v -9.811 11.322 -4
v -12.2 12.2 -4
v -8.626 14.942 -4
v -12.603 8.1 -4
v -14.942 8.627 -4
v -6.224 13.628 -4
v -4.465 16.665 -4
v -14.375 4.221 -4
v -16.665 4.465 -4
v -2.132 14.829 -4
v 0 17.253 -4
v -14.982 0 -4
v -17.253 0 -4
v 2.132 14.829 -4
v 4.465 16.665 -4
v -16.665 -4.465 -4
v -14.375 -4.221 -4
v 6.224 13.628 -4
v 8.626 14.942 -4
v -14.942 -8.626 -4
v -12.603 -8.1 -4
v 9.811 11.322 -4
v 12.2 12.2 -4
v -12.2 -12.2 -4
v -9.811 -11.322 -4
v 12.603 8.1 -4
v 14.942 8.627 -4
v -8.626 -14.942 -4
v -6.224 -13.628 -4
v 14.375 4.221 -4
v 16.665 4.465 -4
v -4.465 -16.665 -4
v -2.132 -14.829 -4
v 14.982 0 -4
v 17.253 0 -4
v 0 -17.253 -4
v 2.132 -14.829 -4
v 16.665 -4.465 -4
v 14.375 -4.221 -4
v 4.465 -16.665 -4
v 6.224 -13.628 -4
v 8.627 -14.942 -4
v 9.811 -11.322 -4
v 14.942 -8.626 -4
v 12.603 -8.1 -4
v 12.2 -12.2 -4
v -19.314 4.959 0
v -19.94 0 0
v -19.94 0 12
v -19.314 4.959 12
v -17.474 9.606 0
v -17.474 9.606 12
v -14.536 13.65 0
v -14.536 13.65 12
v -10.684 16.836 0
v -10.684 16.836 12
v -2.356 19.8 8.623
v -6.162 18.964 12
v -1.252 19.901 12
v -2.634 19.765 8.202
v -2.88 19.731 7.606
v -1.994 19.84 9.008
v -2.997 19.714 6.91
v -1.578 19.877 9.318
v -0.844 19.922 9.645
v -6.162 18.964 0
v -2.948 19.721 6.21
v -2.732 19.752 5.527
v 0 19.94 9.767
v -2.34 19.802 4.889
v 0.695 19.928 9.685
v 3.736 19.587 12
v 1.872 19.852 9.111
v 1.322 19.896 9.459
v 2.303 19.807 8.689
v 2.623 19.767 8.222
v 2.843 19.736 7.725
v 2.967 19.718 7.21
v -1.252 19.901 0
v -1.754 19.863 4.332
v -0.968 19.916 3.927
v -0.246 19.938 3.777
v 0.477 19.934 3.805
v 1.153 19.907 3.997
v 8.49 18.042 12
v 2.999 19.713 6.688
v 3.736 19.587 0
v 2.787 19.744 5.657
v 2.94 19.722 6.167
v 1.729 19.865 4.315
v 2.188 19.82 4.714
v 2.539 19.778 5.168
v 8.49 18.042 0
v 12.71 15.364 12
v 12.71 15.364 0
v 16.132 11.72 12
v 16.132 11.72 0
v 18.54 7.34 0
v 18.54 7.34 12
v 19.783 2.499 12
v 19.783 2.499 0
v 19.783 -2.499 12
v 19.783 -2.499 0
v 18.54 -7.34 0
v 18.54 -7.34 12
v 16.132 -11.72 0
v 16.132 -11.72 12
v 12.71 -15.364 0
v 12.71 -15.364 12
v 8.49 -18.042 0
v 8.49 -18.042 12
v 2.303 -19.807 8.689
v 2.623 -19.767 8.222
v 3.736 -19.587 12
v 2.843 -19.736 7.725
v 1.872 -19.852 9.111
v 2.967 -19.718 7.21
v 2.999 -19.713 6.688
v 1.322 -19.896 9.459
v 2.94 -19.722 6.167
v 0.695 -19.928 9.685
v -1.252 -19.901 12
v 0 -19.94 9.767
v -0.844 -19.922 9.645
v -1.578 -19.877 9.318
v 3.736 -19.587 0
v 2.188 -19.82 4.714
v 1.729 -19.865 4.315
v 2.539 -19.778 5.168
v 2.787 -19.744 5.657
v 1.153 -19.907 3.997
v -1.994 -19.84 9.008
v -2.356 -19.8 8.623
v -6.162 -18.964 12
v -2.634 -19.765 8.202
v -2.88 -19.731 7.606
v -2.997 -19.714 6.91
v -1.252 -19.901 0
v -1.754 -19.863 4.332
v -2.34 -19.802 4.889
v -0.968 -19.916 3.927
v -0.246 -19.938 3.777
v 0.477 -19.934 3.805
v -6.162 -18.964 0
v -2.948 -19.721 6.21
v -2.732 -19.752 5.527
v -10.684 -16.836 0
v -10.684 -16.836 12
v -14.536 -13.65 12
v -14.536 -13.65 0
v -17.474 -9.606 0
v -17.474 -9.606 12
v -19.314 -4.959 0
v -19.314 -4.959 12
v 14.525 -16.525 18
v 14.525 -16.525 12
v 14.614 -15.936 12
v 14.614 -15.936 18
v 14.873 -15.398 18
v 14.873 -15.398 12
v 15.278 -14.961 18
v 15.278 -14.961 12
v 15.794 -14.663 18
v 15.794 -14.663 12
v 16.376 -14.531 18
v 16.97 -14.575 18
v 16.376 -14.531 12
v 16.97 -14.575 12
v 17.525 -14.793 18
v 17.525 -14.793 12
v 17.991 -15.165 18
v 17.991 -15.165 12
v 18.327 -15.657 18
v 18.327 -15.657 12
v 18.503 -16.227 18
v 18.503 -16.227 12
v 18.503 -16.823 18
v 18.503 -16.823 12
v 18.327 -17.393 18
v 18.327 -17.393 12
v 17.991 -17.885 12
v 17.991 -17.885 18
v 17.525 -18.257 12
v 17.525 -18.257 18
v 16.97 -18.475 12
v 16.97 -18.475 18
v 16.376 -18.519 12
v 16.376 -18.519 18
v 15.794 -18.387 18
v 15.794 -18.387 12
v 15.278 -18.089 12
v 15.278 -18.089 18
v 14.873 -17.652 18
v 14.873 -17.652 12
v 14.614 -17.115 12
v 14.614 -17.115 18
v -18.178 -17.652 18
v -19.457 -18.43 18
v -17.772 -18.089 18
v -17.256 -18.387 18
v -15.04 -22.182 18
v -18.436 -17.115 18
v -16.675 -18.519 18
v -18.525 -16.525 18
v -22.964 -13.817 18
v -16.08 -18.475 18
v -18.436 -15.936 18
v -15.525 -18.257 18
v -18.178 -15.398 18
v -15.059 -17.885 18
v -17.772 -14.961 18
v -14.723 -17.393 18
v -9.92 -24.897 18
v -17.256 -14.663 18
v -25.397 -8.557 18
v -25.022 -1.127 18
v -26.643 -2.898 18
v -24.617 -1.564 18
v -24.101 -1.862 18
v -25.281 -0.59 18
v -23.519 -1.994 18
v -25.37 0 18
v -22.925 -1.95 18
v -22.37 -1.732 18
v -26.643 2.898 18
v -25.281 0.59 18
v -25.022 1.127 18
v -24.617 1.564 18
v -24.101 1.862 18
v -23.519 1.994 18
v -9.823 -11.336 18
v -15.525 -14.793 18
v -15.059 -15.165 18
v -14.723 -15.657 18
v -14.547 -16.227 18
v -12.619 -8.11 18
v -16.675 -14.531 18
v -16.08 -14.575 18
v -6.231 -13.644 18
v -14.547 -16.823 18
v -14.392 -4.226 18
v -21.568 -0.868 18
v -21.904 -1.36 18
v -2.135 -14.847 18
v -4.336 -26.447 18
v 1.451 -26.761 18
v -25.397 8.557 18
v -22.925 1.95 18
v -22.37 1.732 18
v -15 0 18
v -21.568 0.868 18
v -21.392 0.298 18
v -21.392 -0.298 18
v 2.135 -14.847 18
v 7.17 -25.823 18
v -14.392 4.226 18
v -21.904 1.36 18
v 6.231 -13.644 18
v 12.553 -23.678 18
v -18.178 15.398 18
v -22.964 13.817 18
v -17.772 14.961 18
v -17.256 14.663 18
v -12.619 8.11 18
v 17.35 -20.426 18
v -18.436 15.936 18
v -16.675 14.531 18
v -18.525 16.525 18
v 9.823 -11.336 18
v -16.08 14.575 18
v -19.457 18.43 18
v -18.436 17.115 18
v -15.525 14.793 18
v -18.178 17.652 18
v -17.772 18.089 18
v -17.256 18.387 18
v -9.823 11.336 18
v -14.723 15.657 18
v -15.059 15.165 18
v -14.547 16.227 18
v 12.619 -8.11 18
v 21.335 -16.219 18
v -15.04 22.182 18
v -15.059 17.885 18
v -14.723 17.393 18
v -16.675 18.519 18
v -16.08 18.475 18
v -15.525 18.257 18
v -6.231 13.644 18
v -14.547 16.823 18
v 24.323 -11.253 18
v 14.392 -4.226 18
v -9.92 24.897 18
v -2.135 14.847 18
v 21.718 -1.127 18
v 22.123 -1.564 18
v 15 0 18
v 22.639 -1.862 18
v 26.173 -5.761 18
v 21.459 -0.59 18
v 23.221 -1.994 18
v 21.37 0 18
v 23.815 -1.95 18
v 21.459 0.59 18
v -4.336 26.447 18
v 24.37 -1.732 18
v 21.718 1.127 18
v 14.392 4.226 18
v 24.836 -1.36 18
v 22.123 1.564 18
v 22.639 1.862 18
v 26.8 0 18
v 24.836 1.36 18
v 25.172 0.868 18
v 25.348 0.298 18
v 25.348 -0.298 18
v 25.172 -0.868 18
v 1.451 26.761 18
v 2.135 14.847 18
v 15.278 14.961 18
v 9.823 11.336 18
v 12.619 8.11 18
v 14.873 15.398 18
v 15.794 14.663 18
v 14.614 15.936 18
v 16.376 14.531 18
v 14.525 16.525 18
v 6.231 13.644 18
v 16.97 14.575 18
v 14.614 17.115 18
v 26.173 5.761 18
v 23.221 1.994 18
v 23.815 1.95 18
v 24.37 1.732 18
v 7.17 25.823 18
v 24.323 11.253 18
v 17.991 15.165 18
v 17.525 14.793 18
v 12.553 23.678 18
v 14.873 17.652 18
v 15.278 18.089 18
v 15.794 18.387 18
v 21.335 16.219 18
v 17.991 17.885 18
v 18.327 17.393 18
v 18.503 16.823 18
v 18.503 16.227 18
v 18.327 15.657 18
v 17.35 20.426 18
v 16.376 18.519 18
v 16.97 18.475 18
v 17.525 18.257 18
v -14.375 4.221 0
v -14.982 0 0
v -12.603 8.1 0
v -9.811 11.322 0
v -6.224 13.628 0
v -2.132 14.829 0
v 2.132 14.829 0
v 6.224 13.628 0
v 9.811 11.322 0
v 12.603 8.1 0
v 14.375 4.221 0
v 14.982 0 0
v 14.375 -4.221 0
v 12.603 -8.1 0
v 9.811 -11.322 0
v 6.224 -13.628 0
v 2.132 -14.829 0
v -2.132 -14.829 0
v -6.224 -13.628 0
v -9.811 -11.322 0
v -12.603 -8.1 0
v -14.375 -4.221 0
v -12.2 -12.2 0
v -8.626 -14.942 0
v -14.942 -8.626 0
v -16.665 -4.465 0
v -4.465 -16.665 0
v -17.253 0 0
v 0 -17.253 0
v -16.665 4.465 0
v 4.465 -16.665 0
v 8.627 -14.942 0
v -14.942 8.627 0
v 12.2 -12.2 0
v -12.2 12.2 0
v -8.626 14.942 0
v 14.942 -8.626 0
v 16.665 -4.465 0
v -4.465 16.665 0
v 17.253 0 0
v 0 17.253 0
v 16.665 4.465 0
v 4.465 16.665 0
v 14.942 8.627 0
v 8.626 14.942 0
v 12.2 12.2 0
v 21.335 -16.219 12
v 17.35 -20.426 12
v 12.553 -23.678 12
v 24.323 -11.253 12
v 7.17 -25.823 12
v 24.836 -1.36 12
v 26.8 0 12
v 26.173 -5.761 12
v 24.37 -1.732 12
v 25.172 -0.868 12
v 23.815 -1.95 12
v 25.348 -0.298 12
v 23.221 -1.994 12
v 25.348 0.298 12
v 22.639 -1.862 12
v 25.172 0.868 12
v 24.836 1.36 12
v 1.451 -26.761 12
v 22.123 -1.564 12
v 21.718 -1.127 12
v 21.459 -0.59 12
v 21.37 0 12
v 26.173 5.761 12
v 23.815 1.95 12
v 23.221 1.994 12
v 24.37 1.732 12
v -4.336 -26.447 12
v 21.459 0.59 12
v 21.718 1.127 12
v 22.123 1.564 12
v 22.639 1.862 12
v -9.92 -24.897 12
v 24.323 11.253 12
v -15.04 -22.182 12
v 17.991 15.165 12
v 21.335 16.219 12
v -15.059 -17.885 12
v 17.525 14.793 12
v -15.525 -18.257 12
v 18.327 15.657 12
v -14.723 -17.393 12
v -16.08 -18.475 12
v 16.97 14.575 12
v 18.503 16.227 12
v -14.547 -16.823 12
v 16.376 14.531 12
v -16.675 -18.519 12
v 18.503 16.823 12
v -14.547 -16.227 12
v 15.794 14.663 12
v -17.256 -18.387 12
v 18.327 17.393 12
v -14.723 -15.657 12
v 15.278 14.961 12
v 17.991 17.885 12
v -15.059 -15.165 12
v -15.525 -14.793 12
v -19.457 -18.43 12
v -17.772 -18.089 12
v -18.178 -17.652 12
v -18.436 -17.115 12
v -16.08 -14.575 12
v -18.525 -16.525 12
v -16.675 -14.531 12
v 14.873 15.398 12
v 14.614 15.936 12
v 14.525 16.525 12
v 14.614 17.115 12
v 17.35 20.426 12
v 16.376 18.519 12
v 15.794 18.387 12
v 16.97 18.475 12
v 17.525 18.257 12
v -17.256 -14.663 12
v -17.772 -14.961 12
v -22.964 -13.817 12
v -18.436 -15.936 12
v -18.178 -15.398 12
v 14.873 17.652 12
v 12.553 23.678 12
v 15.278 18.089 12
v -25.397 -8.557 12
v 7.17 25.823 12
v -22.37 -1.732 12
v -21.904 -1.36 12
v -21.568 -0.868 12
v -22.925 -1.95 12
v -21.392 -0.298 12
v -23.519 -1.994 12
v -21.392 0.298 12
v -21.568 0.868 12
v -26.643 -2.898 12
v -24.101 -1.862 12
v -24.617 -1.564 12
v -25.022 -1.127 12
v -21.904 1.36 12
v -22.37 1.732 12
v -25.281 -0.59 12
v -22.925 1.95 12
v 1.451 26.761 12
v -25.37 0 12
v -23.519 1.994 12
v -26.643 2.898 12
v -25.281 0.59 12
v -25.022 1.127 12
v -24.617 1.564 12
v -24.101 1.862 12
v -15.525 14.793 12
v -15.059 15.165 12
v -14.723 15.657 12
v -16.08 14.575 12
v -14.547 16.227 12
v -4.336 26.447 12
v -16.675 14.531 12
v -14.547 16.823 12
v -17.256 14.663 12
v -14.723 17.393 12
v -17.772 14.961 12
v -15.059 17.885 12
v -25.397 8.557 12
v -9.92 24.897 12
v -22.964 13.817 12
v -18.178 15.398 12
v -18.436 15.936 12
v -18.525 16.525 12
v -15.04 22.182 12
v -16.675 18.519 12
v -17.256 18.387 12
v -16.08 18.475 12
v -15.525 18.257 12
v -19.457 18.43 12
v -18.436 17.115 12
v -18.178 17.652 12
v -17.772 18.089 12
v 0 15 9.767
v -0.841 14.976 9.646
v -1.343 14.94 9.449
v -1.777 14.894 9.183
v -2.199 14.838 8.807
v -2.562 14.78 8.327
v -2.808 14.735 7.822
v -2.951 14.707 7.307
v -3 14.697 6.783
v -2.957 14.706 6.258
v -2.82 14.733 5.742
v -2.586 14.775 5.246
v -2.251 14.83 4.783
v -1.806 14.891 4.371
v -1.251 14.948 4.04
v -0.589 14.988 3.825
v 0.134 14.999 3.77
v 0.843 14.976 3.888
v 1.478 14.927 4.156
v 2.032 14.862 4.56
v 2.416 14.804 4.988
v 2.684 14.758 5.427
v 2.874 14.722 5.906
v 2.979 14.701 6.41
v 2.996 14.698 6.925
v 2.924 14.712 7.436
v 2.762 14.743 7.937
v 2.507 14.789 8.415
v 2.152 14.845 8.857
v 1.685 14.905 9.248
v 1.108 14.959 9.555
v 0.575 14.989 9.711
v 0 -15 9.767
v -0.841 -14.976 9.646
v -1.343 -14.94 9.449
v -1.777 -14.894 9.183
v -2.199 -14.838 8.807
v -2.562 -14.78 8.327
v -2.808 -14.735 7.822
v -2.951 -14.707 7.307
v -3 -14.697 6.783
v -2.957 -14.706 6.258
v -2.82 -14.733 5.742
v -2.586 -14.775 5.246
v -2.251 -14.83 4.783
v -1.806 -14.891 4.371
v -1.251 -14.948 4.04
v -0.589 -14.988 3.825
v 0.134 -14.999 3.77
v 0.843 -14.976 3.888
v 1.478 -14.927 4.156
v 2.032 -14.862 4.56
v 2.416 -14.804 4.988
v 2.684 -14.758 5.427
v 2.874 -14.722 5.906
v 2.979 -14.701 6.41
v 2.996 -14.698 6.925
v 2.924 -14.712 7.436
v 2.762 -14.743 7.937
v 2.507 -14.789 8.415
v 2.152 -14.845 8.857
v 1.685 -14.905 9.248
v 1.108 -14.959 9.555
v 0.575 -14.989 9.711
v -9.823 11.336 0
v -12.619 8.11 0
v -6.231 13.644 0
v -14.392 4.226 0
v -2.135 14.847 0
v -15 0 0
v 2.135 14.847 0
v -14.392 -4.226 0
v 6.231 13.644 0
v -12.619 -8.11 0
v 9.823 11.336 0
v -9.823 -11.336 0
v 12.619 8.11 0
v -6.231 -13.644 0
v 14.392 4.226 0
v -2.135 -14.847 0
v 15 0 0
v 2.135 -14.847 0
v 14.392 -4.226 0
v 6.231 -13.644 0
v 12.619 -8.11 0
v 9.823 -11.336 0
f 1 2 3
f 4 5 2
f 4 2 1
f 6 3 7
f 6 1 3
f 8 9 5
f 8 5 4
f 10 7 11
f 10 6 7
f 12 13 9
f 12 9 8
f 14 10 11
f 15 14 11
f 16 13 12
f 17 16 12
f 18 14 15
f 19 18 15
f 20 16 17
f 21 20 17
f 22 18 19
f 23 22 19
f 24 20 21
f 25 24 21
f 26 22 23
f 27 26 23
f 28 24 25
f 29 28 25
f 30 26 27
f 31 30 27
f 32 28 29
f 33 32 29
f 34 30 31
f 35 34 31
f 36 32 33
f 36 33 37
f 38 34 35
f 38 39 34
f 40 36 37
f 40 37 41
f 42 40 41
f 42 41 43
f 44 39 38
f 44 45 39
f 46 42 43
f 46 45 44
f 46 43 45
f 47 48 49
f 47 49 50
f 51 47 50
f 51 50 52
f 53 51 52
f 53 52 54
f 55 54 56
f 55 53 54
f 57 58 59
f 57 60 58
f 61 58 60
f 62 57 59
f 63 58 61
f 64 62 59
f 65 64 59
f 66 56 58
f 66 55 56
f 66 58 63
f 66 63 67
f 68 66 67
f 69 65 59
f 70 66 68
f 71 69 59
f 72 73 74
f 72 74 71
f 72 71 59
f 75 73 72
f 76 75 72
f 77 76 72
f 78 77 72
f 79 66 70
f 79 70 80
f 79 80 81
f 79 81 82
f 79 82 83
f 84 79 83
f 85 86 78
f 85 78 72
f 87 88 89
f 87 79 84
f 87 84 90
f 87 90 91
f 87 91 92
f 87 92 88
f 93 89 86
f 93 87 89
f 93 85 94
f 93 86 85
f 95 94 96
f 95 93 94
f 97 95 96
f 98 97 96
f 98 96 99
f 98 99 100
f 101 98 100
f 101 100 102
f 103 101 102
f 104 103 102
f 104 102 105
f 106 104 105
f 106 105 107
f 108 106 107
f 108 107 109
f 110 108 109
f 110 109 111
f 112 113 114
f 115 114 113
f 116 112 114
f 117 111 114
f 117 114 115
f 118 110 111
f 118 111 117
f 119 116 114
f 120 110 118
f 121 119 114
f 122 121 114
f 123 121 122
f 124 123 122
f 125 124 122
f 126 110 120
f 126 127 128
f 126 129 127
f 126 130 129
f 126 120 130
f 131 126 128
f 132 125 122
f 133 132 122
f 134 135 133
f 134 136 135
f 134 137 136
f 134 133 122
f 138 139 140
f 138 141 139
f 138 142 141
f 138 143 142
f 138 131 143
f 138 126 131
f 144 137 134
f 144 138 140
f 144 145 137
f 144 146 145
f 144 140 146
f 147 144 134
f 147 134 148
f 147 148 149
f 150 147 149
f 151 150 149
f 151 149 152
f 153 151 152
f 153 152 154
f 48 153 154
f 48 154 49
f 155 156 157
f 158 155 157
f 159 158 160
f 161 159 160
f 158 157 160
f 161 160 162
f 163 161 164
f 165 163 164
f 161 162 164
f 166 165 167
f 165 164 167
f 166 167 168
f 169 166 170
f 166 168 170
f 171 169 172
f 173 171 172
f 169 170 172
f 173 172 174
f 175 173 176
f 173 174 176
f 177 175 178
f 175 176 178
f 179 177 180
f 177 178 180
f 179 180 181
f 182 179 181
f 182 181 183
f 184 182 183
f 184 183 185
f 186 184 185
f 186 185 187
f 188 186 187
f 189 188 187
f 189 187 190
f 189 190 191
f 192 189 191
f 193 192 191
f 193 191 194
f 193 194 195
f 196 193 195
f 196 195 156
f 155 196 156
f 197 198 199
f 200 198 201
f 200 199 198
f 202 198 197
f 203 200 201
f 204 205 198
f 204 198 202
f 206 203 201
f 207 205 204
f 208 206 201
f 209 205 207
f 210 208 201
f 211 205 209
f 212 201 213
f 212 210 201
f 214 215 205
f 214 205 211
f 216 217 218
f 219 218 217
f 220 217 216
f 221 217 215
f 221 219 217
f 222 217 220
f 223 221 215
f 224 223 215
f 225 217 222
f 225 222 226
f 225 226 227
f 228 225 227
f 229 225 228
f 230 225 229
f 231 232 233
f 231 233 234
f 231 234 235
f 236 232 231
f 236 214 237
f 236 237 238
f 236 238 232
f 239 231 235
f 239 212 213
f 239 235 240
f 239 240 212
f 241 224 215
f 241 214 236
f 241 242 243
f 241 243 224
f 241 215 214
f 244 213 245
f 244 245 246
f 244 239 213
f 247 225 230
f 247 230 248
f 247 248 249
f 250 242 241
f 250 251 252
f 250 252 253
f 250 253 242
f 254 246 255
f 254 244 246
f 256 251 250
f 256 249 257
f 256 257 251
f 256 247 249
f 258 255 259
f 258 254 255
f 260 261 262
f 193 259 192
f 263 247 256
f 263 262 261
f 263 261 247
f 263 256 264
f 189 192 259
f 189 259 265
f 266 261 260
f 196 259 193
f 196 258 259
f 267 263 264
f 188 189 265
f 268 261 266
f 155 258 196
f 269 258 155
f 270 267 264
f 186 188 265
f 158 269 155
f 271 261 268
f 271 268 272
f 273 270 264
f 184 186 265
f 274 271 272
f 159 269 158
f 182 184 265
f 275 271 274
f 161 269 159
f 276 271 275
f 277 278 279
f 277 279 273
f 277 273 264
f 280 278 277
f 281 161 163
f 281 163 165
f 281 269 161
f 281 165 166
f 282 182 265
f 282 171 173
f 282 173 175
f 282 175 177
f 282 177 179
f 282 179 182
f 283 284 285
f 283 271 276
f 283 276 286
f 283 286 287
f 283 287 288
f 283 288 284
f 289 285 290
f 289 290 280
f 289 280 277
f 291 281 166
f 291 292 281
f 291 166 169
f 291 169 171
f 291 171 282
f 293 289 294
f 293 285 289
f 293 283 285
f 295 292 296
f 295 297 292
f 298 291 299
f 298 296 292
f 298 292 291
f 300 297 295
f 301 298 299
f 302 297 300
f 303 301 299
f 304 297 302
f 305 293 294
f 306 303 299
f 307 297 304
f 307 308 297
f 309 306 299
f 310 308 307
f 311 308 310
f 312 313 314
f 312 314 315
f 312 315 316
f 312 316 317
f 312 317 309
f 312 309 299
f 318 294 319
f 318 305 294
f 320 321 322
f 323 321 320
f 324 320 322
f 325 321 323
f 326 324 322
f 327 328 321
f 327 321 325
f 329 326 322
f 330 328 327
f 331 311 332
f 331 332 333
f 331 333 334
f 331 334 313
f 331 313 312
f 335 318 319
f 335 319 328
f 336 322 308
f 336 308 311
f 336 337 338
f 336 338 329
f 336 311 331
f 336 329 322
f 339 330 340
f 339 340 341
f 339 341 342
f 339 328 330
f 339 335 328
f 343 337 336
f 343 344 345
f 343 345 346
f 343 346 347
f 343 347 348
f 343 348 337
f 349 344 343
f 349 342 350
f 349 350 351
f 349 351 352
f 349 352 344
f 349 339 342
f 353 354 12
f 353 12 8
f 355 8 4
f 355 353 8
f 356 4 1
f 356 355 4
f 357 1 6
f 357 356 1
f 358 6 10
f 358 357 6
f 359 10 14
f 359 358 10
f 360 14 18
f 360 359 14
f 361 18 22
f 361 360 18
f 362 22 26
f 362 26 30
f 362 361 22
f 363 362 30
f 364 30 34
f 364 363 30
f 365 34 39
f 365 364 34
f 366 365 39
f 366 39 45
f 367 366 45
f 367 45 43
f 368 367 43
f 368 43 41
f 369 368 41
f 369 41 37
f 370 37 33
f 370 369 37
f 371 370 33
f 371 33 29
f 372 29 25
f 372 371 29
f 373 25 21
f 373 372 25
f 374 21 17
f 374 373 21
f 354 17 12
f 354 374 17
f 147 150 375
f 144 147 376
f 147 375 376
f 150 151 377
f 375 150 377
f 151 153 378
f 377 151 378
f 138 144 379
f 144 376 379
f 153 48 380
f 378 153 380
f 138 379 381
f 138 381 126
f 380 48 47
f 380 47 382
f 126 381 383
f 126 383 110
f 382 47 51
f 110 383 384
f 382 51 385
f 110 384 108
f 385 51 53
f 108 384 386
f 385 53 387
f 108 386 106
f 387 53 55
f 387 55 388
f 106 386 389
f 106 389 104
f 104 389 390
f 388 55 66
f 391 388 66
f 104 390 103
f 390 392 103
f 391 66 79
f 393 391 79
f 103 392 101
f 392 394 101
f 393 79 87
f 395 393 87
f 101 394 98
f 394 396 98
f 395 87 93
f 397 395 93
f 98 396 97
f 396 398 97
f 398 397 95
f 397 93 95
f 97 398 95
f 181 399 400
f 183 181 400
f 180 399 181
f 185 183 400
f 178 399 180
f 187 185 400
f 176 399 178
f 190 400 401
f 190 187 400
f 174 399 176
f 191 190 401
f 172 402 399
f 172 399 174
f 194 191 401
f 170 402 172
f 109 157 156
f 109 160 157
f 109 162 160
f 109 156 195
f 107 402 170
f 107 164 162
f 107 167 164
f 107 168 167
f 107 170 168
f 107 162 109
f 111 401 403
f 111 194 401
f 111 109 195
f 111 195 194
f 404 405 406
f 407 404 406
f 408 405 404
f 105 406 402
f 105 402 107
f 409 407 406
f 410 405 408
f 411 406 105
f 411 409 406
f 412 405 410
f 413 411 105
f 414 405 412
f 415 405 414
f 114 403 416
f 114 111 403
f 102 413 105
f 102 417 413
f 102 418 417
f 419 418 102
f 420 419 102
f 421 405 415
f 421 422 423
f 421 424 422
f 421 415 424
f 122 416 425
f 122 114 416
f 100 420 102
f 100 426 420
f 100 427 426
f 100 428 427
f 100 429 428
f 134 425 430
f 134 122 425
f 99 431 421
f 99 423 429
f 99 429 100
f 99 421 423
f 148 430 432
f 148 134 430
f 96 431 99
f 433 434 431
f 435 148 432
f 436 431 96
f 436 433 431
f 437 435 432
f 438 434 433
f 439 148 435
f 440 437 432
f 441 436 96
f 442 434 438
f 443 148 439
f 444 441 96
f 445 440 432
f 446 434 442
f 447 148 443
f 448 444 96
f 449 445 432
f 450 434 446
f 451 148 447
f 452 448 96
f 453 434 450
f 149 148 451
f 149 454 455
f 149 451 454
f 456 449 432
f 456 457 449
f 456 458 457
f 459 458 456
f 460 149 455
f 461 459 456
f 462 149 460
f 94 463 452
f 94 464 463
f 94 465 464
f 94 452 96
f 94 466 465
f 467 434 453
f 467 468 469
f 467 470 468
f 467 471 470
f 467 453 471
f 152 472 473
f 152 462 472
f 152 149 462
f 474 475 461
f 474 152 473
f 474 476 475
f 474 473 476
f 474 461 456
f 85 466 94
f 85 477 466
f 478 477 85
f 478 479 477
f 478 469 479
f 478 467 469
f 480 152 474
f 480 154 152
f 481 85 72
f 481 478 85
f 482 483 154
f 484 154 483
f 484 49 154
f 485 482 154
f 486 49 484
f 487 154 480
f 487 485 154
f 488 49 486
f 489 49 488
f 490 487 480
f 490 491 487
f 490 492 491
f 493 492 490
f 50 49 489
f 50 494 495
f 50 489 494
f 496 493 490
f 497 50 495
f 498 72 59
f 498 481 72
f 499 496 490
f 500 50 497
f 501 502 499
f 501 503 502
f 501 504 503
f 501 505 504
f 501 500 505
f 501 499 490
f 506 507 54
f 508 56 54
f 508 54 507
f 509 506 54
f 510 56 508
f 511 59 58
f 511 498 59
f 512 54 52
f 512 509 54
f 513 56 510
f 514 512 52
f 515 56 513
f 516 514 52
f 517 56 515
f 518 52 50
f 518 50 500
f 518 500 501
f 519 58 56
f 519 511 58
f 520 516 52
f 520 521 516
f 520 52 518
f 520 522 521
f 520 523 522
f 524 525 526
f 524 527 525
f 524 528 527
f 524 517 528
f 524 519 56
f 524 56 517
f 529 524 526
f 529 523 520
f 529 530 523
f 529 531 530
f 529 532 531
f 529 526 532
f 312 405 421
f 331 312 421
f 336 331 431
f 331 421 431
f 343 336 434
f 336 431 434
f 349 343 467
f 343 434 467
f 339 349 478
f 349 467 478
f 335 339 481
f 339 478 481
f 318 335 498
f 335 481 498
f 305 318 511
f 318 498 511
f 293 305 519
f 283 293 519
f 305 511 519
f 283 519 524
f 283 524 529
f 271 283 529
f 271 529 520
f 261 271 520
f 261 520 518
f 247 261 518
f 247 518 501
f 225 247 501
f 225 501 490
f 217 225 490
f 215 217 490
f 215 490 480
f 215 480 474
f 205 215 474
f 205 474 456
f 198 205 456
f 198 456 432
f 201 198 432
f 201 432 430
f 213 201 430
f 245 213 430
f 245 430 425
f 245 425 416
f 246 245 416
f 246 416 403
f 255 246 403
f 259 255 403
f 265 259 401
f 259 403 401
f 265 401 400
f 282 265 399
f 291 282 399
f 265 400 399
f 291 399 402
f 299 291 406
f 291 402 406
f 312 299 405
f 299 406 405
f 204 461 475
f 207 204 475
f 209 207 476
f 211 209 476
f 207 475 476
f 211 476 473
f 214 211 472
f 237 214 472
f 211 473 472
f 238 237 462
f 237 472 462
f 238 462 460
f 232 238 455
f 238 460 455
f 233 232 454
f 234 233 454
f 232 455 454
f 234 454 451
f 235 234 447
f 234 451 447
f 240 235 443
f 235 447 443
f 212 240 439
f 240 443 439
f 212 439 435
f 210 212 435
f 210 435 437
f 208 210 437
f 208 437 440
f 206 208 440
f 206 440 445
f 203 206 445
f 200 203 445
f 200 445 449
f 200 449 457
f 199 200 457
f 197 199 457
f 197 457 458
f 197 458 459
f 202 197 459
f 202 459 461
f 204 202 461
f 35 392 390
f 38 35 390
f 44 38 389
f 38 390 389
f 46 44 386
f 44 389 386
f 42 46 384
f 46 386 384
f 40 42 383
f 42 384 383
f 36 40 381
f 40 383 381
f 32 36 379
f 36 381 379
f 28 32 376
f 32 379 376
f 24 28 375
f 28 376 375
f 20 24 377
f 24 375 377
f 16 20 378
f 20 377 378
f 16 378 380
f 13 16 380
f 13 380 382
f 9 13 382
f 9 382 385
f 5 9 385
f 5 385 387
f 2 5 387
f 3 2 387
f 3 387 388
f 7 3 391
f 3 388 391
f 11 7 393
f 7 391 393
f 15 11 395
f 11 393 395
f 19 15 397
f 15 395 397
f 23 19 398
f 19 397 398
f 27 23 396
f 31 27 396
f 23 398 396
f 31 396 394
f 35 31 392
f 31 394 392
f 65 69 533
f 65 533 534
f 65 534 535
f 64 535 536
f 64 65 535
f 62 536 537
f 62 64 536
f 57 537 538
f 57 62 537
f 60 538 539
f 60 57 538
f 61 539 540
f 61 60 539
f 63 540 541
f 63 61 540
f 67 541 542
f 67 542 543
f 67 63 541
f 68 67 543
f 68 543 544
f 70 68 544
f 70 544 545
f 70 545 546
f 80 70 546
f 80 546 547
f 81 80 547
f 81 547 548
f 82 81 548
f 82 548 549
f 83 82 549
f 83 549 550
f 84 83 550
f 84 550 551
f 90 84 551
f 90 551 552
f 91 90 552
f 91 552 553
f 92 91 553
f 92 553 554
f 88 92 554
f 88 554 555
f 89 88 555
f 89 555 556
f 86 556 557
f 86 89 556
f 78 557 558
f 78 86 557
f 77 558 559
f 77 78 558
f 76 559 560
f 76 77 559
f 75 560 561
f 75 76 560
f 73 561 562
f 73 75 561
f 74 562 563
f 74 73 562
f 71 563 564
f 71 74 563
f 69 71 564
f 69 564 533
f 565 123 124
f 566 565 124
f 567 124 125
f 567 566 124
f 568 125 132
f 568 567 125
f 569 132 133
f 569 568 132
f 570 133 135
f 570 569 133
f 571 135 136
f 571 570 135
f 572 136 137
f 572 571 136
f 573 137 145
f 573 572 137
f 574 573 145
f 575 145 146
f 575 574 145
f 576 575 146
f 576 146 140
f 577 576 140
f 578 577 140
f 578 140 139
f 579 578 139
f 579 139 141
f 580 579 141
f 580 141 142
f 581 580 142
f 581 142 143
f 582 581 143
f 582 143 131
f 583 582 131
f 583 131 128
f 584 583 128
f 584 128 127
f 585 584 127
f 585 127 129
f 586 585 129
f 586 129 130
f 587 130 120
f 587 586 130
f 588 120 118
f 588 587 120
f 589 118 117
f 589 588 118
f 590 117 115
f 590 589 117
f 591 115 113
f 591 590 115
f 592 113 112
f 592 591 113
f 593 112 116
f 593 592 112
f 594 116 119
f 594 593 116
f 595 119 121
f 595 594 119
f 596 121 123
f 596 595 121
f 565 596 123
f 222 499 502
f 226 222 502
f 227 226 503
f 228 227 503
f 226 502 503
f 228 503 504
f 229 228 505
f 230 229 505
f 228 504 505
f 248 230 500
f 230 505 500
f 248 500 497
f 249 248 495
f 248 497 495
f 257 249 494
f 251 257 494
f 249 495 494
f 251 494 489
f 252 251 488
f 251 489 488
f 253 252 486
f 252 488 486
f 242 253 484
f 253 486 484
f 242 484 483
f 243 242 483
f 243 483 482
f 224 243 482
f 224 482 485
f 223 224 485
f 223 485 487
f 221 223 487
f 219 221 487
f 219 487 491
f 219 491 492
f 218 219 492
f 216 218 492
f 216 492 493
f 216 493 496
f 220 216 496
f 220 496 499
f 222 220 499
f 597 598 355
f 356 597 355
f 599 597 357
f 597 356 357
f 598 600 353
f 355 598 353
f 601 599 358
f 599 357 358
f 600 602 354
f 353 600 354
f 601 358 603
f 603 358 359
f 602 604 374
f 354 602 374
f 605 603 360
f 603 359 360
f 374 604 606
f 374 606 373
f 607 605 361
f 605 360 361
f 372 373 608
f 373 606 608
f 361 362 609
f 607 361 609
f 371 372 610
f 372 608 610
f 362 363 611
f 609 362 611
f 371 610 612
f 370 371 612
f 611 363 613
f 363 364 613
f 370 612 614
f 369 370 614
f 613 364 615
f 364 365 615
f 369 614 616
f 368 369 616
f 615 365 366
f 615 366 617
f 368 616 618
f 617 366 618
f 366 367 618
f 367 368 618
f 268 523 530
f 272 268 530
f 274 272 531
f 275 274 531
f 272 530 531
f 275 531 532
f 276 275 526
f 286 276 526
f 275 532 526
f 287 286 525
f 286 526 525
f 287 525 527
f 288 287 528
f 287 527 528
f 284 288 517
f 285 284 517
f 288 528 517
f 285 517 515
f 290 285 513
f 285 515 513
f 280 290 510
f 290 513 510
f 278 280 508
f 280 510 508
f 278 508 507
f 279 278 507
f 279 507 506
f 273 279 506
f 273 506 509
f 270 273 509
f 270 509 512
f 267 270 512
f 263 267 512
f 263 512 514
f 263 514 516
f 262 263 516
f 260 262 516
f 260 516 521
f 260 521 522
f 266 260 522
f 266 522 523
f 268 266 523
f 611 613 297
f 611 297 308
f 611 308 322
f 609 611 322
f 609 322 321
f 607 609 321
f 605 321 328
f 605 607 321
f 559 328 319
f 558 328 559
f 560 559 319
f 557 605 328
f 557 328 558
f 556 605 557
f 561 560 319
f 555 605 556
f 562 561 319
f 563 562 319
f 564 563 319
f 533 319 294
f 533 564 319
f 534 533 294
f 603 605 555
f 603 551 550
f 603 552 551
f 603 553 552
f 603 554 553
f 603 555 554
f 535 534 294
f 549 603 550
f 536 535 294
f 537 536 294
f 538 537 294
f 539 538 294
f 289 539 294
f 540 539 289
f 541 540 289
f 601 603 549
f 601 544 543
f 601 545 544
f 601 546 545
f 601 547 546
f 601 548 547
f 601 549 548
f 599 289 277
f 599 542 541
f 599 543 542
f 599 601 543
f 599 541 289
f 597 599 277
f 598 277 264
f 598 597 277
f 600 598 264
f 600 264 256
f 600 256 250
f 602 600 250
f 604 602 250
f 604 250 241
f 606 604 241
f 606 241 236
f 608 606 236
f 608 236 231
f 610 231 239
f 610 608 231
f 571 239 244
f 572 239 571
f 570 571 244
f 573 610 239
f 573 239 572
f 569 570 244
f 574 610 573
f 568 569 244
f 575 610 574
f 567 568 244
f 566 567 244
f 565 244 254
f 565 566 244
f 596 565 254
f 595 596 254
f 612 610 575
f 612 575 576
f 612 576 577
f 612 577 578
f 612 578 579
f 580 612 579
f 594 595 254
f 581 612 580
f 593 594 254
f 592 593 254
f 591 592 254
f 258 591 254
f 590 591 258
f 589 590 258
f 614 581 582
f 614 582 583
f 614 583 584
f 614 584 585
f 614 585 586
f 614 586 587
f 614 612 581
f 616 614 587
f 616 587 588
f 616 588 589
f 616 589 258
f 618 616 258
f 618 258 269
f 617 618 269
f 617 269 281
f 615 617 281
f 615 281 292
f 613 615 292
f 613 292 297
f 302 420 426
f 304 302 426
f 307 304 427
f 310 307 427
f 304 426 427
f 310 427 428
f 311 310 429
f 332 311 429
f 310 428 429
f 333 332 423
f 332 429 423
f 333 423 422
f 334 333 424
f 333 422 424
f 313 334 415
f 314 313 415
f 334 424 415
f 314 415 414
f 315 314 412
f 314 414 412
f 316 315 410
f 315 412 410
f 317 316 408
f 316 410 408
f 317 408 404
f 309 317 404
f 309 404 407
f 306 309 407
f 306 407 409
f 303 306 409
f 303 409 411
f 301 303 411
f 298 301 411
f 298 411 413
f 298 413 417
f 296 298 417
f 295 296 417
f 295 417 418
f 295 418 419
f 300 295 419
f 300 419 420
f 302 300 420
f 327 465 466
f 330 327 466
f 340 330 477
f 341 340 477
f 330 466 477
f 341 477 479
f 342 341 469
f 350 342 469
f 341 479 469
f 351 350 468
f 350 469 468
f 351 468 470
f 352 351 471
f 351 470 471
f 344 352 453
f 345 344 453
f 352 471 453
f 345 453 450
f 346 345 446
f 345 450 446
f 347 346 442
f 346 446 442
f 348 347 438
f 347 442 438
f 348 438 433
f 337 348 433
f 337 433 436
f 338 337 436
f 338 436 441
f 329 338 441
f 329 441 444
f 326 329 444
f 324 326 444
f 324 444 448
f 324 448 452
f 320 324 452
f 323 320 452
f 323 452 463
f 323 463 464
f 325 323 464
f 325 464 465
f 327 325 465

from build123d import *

# Parameters (mm, degrees)
SKETCH_1_R          = 26.8
SKETCH_1_R_2        = 15
EXTRUDE_1_DEPTH     = 18
SKETCH_2_R          = 17.253
SKETCH_2_R_2        = 14.981500248
EXTRUDE_2_DEPTH     = 4
SKETCH_3_R          = 26.8
SKETCH_3_R_2        = 19.94
CUT_EXTRUDE_3_DEPTH = 12
SKETCH_5_R          = 2
CUT_EXTRUDE_4_DEPTH = 42.139761788
SKETCH_7_R          = 3
CUT_EXTRUDE_8_DEPTH = 100


with BuildPart() as part:
    # Эскиз1 → Вытянуть1 (new body)
    with BuildSketch(Plane.XY):
        Circle(SKETCH_1_R)
        Circle(SKETCH_1_R_2, mode=Mode.SUBTRACT)
    extrude(amount=EXTRUDE_1_DEPTH)

    # Эскиз2 → Вытянуть2 (add)
    with BuildSketch(Plane(origin=(0, 0, 0), x_dir=(-1, 0, 0), z_dir=(0, 0, -1))):
        with Locations(Location((0, 0, 0), (0, 0, 180))):
            Circle(SKETCH_2_R)
        Circle(SKETCH_2_R_2, mode=Mode.SUBTRACT)
    extrude(amount=EXTRUDE_2_DEPTH)

    # Эскиз3 → Вытянуть3 (cut)
    with BuildSketch(Plane(origin=(0, 0, 0), x_dir=(-1, 0, 0), z_dir=(0, 0, -1))):
        Circle(SKETCH_3_R)
        Circle(SKETCH_3_R_2, mode=Mode.SUBTRACT)
    extrude(amount=-CUT_EXTRUDE_3_DEPTH, mode=Mode.SUBTRACT)

    # Эскиз5 → Вытянуть4 (cut, through all)
    with BuildSketch(Plane(origin=(0, 0, 12), x_dir=(-1, 0, 0), z_dir=(0, 0, -1))):
        with Locations((-23.37, 0)):
            Circle(SKETCH_5_R)
        with Locations((-16.525085476, 16.525085476)):
            Circle(SKETCH_5_R)
        with Locations((16.525085476, 16.525085476)):
            Circle(SKETCH_5_R)
        with Locations((23.37, 0)):
            Circle(SKETCH_5_R)
        with Locations((16.525085476, -16.525085476)):
            Circle(SKETCH_5_R)
        with Locations((-16.525085476, -16.525085476)):
            Circle(SKETCH_5_R)
    extrude(amount=-CUT_EXTRUDE_4_DEPTH, mode=Mode.SUBTRACT)

    # Эскиз7 → Вытянуть8 (cut)
    with BuildSketch(Plane(origin=(0, 29.05014473, 12), x_dir=(1, 0, 0), z_dir=(0, -1, 0))):
        with Locations(Location((0, -5.233499887, 0), (0, 0, 90))):
            Circle(SKETCH_7_R)
    extrude(amount=CUT_EXTRUDE_8_DEPTH, mode=Mode.SUBTRACT)


solid = part.part
